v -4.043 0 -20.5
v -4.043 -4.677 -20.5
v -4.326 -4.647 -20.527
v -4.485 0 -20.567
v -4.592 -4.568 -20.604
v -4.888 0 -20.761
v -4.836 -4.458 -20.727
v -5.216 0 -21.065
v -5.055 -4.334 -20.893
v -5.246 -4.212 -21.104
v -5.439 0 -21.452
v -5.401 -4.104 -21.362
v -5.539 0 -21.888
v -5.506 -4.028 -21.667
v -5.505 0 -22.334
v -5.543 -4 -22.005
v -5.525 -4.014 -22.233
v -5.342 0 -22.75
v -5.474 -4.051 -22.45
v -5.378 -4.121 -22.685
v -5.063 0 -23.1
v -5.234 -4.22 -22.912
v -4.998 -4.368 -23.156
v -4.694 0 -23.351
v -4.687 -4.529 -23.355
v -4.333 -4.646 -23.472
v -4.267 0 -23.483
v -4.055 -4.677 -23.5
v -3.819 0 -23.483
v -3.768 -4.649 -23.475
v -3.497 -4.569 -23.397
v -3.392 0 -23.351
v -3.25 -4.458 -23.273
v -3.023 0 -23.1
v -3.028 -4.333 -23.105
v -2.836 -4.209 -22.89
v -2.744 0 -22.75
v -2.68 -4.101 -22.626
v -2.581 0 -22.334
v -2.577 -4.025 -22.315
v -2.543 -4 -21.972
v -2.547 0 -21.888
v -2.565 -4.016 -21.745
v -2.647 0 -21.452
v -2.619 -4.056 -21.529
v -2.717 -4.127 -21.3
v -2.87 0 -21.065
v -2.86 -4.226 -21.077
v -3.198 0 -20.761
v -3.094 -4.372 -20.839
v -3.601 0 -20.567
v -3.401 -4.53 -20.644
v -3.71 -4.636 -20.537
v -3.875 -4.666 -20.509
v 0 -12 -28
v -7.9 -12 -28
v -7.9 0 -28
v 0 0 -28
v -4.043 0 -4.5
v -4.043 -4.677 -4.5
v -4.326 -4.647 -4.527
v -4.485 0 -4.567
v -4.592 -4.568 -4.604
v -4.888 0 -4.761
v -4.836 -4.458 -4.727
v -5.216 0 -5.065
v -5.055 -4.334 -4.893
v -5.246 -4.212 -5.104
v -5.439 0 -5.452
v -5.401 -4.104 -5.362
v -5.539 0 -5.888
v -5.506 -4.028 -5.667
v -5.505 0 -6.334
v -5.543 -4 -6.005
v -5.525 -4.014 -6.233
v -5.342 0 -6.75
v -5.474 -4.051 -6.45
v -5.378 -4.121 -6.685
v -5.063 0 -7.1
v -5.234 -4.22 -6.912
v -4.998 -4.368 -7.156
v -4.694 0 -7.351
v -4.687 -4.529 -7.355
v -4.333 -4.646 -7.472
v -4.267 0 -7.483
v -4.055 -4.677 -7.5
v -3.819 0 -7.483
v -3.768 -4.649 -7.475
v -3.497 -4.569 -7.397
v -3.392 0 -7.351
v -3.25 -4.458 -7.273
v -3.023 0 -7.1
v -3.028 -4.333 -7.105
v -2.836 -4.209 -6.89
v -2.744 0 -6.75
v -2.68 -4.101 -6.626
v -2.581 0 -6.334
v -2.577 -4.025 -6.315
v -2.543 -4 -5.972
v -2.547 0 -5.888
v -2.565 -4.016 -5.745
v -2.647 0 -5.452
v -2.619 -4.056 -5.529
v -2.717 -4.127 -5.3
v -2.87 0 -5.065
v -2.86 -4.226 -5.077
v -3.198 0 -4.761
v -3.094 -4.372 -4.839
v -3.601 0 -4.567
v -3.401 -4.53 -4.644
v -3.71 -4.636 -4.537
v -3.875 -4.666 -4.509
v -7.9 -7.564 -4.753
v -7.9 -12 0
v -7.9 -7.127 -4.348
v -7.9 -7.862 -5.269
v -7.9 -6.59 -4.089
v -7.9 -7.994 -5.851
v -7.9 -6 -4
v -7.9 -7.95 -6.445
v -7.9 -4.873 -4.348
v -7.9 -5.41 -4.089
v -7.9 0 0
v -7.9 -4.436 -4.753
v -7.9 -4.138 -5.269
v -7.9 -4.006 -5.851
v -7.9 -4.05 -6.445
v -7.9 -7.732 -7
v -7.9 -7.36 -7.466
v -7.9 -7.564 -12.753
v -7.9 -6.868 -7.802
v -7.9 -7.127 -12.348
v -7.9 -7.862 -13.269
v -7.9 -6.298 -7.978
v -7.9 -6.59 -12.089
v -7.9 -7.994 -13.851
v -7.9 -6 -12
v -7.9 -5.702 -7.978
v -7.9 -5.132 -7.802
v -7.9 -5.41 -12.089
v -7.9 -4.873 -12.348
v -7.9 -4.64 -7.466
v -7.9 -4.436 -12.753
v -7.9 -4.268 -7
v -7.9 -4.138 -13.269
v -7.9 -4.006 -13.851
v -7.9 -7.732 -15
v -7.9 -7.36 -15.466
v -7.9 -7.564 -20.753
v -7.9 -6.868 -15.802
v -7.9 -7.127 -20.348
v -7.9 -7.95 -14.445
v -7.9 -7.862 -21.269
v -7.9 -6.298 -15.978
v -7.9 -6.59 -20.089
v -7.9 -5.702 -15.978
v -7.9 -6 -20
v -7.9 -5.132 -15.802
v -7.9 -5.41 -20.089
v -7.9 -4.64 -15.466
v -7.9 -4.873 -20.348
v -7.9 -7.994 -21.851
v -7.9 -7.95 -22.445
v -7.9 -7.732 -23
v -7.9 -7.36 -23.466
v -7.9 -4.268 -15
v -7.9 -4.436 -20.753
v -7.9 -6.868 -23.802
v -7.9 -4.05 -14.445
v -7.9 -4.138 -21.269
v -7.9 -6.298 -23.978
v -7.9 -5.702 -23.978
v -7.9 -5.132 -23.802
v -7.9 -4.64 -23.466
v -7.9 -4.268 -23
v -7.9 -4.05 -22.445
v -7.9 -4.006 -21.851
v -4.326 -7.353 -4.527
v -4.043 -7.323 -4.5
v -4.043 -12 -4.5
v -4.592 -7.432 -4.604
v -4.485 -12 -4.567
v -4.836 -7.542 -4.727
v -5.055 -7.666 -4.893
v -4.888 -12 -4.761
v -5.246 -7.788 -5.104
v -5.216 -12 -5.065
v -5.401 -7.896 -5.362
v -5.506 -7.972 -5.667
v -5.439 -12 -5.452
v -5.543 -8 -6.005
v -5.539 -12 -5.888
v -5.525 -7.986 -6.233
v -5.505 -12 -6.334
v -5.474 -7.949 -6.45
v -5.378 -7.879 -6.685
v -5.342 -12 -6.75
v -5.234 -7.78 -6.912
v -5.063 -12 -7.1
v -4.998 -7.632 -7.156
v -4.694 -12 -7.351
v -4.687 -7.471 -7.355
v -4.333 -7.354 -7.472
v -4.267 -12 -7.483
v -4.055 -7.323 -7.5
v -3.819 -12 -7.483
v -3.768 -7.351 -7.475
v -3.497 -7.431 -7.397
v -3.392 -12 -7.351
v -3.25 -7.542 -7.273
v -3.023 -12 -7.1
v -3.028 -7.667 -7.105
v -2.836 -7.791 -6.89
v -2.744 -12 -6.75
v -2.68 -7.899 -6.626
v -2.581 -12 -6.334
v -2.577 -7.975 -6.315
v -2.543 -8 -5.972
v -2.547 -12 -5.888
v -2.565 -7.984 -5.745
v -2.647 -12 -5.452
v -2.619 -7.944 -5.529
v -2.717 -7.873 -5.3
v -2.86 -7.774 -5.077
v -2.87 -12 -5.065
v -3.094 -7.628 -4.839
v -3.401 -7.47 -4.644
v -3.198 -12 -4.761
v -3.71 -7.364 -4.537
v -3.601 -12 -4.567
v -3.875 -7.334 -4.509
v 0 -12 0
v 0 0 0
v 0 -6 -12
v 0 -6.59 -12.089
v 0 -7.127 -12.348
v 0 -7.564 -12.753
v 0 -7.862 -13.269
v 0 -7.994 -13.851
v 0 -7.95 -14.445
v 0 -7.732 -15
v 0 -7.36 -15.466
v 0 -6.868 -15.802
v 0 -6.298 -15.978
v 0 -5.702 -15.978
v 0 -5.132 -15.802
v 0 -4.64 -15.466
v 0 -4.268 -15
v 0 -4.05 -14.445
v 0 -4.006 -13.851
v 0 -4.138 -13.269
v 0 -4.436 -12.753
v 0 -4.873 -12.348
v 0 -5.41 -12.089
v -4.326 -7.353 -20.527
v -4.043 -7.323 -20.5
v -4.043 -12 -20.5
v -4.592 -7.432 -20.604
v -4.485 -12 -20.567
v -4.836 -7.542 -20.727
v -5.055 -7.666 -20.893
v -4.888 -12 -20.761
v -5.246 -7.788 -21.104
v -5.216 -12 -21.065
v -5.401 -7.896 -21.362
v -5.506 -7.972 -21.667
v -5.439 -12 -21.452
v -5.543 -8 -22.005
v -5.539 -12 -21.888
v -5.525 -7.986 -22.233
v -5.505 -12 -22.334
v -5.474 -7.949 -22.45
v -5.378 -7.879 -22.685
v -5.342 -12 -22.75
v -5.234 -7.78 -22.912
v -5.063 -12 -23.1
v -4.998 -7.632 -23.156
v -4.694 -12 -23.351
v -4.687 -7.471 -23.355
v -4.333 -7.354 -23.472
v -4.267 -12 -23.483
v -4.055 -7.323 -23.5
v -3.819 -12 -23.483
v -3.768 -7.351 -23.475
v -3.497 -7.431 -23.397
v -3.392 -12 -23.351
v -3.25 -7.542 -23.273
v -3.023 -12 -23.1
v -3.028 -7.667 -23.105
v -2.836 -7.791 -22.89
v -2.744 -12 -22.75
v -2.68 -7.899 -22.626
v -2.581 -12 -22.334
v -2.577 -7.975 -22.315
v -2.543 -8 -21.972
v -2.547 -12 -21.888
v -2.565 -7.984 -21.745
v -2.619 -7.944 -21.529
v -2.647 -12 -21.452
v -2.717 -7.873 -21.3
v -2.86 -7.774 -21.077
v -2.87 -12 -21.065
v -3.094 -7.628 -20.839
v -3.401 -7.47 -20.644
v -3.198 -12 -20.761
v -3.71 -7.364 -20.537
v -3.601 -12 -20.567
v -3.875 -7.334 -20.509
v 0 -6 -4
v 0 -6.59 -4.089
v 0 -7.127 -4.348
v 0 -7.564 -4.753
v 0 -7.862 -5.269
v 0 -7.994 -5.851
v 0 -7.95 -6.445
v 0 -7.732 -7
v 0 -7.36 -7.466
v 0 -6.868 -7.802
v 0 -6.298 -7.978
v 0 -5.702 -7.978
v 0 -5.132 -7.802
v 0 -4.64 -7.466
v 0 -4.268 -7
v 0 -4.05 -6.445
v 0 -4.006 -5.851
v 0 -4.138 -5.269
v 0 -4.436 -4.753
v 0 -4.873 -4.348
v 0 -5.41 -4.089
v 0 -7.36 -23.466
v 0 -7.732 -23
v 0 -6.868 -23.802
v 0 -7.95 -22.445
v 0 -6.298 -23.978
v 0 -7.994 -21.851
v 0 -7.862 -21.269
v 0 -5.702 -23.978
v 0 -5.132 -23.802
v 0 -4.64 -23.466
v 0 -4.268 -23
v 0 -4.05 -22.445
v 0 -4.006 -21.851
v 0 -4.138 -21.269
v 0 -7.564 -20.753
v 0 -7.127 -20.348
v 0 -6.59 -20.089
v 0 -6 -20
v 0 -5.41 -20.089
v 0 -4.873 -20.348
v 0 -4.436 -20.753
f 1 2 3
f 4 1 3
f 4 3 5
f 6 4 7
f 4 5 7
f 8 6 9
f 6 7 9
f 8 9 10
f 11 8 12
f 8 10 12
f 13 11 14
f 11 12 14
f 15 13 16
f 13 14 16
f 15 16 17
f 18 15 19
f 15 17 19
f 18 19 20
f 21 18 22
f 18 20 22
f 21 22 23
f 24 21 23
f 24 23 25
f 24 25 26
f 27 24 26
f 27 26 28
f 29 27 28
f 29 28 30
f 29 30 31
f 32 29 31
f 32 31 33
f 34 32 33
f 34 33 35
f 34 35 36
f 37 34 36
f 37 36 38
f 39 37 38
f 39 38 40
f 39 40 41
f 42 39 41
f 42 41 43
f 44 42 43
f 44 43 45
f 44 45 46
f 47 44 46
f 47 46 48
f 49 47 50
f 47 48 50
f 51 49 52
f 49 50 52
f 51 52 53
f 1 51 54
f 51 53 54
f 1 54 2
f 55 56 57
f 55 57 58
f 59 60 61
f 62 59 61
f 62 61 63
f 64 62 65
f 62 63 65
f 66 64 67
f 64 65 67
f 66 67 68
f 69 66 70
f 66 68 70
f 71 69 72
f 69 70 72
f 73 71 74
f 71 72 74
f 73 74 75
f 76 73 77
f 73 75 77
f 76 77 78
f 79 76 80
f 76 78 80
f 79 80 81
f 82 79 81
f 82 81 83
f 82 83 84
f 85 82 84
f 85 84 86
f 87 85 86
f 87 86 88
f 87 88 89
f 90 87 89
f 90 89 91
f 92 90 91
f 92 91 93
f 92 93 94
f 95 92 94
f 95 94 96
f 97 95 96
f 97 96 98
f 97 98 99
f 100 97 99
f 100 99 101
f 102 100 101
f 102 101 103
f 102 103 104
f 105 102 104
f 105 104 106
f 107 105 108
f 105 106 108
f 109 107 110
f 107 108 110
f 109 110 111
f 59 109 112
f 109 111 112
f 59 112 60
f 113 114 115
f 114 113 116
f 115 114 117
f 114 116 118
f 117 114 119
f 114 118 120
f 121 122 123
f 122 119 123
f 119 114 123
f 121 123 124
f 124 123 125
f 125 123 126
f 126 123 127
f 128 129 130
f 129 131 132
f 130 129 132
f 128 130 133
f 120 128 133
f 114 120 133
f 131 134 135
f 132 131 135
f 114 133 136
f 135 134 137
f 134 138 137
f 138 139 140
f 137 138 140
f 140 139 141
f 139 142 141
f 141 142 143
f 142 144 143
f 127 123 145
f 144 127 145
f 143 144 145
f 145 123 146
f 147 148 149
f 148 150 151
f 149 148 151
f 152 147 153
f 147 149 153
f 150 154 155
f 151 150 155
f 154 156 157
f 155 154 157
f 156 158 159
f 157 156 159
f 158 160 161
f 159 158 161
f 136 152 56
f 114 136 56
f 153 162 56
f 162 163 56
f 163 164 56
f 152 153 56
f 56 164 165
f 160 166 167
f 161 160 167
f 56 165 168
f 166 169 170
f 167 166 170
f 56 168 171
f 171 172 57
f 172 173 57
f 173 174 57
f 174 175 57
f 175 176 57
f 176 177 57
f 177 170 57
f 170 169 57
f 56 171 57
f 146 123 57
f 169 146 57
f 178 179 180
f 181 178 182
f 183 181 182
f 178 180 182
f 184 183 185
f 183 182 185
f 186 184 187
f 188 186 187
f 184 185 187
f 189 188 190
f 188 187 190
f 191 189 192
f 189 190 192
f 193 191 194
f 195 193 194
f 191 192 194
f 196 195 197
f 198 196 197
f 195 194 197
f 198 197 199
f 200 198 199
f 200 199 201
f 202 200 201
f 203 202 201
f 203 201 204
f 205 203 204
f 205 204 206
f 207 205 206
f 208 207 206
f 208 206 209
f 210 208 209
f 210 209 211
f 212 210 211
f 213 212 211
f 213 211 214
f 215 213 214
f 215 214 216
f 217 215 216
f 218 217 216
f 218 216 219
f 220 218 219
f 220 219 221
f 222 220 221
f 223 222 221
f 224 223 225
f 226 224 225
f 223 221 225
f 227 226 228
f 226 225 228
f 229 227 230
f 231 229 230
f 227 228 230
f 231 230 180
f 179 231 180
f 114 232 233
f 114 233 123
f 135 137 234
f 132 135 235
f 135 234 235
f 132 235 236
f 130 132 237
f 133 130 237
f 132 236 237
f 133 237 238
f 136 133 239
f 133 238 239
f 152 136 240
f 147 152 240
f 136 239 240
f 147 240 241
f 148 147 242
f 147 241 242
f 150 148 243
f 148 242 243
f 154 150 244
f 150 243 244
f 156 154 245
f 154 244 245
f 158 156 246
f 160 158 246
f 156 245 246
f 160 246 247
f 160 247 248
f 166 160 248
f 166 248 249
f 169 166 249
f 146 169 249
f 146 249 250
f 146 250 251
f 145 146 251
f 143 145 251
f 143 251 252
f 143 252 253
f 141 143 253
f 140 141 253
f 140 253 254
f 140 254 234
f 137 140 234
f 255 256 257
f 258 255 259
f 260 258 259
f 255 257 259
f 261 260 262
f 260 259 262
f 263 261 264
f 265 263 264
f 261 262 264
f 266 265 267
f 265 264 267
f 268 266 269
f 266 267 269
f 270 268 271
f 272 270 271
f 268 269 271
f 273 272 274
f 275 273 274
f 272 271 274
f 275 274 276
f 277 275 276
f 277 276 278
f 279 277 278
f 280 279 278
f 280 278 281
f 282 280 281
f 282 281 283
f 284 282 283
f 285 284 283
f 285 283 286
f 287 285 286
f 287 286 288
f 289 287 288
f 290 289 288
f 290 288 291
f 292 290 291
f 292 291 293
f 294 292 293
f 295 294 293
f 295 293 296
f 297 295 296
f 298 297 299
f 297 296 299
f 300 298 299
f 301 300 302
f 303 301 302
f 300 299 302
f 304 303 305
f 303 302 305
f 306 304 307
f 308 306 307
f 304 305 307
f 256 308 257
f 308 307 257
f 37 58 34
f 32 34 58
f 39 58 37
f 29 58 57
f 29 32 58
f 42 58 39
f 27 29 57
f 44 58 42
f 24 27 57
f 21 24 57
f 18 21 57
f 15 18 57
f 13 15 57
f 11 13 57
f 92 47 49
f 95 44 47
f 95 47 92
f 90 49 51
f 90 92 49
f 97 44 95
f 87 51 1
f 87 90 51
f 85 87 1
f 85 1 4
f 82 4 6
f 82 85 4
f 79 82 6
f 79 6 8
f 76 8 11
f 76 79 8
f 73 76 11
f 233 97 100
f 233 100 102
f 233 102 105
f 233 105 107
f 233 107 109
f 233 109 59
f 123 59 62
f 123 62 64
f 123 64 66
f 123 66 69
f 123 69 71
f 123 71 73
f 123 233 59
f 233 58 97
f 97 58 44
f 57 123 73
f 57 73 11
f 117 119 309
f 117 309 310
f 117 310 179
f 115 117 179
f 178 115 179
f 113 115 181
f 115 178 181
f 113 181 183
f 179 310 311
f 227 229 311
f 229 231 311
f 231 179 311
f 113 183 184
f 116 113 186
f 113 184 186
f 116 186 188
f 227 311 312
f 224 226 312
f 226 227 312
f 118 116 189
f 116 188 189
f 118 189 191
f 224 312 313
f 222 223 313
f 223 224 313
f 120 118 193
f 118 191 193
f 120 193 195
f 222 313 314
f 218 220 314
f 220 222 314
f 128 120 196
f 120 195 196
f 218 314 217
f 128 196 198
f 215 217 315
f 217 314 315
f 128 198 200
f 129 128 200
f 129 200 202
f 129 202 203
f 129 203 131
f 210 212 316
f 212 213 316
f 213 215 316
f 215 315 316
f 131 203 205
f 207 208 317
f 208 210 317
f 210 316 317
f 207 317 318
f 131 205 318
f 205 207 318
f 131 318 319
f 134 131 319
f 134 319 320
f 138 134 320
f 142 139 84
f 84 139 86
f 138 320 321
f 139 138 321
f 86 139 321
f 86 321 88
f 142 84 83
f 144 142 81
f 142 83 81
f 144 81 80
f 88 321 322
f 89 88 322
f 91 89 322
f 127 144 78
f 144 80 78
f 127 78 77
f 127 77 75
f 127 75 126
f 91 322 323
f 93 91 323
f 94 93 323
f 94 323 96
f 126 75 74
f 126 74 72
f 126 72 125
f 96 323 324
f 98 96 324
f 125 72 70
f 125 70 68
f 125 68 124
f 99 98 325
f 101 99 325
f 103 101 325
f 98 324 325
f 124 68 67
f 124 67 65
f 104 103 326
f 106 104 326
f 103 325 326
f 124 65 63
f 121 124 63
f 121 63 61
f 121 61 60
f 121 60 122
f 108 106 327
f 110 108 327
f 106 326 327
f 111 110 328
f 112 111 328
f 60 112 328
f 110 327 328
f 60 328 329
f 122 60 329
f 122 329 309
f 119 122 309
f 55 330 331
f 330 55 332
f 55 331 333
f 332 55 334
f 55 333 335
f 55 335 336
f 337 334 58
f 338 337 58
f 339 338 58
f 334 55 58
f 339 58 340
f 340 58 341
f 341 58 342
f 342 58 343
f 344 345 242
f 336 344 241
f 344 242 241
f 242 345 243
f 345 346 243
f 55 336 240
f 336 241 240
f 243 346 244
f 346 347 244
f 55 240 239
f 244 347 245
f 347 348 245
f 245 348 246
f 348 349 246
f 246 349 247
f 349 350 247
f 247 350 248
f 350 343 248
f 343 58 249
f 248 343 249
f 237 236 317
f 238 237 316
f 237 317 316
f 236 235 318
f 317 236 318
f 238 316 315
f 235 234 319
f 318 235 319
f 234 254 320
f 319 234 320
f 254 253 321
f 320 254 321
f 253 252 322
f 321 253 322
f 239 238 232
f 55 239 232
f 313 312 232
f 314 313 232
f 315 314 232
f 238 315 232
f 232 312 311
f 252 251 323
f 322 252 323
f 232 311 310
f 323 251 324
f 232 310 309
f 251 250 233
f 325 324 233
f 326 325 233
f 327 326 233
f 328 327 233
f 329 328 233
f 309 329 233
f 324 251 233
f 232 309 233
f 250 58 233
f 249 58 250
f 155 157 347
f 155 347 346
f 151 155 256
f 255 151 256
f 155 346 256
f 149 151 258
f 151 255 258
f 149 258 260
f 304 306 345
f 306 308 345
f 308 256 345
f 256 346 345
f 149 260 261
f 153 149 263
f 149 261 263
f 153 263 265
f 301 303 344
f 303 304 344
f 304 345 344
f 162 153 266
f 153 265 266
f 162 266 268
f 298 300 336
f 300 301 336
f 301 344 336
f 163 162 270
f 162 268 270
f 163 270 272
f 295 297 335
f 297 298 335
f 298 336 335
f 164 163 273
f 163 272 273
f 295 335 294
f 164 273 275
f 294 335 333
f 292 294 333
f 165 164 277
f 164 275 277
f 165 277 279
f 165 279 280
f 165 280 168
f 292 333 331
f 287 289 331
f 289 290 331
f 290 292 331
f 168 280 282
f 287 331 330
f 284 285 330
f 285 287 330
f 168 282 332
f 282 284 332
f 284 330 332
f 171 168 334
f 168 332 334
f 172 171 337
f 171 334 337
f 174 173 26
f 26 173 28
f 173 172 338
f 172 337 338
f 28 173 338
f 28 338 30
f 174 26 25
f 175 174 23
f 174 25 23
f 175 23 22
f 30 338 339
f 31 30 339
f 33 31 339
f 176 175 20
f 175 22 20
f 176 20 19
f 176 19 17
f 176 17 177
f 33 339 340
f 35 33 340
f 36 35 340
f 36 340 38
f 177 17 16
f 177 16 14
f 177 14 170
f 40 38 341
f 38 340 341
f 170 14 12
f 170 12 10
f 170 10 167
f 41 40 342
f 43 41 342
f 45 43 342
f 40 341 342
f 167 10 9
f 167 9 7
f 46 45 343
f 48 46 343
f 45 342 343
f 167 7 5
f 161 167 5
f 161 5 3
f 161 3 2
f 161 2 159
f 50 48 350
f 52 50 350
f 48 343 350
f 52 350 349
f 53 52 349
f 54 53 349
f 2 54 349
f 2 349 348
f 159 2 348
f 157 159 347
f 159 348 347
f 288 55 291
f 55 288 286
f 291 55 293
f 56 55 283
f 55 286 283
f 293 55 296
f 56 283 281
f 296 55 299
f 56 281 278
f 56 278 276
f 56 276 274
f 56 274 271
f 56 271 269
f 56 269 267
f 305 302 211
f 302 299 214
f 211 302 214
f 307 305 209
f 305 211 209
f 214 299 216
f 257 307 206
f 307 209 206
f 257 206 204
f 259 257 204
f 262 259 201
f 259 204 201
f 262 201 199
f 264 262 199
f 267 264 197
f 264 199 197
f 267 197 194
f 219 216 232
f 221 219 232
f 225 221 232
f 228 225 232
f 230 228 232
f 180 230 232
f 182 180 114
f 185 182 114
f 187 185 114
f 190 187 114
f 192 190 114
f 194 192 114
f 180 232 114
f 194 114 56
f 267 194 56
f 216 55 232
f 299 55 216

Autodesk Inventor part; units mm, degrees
ref_plane "YZ Plane" through (0, 0, 0) normal (1, 0, 0) x (0, 1, 0)
ref_plane "XZ Plane" through (0, 0, 0) normal (0, 1, 0) x (-1, 0, 0)
ref_plane "XY Plane" through (0, 0, 0) normal (0, 0, 1) x (1, 0, 0)
sketch "Sketch1" plane through (0, 0, 0) normal (0, 1, 0) x (-1, 0, 0)
  line L0 (0, 0) -> (7.9, 0)
  line L1 (7.9, 0) -> (7.9, -28)
  line L2 (7.9, -28) -> (0, -28)
  line L3 (0, -28) -> (0, 0)
  dimension "d0" = 7.9
  dimension "d1" = 28
extrude "Extrusion1" add sketch "Sketch1" against normal blind 12
sketch "Sketch2" plane through (0, 0, 0) normal (0, 1, 0) x (1, 0, 0)
  line L0 (0, 0) -> (-7.9, 0) projected
  line L1 (-7.9, 28) -> (0, 28) projected
  point P0 (-4.043, 6)
  point P1 (-4.043, 22)
  dimension "d4" = 6
  dimension "d5" = 6
hole "Hole1" at (-4.043, 0, -6) at (-4.043, 0, -22) direction (0, -1, 0) diameter 3 end through all
sketch "Sketch3" plane through (-7.9, 0, -28) normal (-1, 0, 0) x (0, 0, 1)
  line L0 (28, 0) -> (28, -12) projected
  point P0 (22, -6)
  point P1 (14, -6)
  point P2 (6, -6)
  point P3 (28, -6)
  dimension "d13" = 6
  dimension "d14" = 8
  dimension "d15" = 8
hole "Hole2" at (-7.9, -6, -6) at (-7.9, -6, -14) at (-7.9, -6, -22) direction (1, 0, 0) diameter 4 end through all
equation "\"d15\" = d14"
properties part number "09-0004" material "Aluminum 6061"
